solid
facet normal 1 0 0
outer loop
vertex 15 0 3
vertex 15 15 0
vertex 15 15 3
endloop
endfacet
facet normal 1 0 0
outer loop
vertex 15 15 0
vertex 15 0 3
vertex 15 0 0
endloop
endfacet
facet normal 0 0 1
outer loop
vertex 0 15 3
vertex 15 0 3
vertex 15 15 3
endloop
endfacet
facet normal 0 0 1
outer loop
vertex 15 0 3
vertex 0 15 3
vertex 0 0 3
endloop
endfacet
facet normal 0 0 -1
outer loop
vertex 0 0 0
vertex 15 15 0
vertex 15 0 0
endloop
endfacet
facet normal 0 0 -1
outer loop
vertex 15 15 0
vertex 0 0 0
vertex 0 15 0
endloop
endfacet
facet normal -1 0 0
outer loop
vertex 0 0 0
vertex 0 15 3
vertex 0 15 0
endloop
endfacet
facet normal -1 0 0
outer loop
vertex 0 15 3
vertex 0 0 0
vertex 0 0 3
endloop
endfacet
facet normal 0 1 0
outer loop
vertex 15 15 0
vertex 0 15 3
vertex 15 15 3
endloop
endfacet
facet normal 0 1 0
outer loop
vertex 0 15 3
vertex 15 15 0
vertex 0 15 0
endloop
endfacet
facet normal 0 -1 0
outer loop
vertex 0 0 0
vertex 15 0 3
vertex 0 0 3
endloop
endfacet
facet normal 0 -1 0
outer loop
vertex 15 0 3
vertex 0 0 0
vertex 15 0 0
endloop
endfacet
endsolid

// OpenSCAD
difference(){
	union(){ 
        translate([0,0,0]){
           cube([15,15,3
            ], center=false);
        }                
	}
	union() {

	}
}
